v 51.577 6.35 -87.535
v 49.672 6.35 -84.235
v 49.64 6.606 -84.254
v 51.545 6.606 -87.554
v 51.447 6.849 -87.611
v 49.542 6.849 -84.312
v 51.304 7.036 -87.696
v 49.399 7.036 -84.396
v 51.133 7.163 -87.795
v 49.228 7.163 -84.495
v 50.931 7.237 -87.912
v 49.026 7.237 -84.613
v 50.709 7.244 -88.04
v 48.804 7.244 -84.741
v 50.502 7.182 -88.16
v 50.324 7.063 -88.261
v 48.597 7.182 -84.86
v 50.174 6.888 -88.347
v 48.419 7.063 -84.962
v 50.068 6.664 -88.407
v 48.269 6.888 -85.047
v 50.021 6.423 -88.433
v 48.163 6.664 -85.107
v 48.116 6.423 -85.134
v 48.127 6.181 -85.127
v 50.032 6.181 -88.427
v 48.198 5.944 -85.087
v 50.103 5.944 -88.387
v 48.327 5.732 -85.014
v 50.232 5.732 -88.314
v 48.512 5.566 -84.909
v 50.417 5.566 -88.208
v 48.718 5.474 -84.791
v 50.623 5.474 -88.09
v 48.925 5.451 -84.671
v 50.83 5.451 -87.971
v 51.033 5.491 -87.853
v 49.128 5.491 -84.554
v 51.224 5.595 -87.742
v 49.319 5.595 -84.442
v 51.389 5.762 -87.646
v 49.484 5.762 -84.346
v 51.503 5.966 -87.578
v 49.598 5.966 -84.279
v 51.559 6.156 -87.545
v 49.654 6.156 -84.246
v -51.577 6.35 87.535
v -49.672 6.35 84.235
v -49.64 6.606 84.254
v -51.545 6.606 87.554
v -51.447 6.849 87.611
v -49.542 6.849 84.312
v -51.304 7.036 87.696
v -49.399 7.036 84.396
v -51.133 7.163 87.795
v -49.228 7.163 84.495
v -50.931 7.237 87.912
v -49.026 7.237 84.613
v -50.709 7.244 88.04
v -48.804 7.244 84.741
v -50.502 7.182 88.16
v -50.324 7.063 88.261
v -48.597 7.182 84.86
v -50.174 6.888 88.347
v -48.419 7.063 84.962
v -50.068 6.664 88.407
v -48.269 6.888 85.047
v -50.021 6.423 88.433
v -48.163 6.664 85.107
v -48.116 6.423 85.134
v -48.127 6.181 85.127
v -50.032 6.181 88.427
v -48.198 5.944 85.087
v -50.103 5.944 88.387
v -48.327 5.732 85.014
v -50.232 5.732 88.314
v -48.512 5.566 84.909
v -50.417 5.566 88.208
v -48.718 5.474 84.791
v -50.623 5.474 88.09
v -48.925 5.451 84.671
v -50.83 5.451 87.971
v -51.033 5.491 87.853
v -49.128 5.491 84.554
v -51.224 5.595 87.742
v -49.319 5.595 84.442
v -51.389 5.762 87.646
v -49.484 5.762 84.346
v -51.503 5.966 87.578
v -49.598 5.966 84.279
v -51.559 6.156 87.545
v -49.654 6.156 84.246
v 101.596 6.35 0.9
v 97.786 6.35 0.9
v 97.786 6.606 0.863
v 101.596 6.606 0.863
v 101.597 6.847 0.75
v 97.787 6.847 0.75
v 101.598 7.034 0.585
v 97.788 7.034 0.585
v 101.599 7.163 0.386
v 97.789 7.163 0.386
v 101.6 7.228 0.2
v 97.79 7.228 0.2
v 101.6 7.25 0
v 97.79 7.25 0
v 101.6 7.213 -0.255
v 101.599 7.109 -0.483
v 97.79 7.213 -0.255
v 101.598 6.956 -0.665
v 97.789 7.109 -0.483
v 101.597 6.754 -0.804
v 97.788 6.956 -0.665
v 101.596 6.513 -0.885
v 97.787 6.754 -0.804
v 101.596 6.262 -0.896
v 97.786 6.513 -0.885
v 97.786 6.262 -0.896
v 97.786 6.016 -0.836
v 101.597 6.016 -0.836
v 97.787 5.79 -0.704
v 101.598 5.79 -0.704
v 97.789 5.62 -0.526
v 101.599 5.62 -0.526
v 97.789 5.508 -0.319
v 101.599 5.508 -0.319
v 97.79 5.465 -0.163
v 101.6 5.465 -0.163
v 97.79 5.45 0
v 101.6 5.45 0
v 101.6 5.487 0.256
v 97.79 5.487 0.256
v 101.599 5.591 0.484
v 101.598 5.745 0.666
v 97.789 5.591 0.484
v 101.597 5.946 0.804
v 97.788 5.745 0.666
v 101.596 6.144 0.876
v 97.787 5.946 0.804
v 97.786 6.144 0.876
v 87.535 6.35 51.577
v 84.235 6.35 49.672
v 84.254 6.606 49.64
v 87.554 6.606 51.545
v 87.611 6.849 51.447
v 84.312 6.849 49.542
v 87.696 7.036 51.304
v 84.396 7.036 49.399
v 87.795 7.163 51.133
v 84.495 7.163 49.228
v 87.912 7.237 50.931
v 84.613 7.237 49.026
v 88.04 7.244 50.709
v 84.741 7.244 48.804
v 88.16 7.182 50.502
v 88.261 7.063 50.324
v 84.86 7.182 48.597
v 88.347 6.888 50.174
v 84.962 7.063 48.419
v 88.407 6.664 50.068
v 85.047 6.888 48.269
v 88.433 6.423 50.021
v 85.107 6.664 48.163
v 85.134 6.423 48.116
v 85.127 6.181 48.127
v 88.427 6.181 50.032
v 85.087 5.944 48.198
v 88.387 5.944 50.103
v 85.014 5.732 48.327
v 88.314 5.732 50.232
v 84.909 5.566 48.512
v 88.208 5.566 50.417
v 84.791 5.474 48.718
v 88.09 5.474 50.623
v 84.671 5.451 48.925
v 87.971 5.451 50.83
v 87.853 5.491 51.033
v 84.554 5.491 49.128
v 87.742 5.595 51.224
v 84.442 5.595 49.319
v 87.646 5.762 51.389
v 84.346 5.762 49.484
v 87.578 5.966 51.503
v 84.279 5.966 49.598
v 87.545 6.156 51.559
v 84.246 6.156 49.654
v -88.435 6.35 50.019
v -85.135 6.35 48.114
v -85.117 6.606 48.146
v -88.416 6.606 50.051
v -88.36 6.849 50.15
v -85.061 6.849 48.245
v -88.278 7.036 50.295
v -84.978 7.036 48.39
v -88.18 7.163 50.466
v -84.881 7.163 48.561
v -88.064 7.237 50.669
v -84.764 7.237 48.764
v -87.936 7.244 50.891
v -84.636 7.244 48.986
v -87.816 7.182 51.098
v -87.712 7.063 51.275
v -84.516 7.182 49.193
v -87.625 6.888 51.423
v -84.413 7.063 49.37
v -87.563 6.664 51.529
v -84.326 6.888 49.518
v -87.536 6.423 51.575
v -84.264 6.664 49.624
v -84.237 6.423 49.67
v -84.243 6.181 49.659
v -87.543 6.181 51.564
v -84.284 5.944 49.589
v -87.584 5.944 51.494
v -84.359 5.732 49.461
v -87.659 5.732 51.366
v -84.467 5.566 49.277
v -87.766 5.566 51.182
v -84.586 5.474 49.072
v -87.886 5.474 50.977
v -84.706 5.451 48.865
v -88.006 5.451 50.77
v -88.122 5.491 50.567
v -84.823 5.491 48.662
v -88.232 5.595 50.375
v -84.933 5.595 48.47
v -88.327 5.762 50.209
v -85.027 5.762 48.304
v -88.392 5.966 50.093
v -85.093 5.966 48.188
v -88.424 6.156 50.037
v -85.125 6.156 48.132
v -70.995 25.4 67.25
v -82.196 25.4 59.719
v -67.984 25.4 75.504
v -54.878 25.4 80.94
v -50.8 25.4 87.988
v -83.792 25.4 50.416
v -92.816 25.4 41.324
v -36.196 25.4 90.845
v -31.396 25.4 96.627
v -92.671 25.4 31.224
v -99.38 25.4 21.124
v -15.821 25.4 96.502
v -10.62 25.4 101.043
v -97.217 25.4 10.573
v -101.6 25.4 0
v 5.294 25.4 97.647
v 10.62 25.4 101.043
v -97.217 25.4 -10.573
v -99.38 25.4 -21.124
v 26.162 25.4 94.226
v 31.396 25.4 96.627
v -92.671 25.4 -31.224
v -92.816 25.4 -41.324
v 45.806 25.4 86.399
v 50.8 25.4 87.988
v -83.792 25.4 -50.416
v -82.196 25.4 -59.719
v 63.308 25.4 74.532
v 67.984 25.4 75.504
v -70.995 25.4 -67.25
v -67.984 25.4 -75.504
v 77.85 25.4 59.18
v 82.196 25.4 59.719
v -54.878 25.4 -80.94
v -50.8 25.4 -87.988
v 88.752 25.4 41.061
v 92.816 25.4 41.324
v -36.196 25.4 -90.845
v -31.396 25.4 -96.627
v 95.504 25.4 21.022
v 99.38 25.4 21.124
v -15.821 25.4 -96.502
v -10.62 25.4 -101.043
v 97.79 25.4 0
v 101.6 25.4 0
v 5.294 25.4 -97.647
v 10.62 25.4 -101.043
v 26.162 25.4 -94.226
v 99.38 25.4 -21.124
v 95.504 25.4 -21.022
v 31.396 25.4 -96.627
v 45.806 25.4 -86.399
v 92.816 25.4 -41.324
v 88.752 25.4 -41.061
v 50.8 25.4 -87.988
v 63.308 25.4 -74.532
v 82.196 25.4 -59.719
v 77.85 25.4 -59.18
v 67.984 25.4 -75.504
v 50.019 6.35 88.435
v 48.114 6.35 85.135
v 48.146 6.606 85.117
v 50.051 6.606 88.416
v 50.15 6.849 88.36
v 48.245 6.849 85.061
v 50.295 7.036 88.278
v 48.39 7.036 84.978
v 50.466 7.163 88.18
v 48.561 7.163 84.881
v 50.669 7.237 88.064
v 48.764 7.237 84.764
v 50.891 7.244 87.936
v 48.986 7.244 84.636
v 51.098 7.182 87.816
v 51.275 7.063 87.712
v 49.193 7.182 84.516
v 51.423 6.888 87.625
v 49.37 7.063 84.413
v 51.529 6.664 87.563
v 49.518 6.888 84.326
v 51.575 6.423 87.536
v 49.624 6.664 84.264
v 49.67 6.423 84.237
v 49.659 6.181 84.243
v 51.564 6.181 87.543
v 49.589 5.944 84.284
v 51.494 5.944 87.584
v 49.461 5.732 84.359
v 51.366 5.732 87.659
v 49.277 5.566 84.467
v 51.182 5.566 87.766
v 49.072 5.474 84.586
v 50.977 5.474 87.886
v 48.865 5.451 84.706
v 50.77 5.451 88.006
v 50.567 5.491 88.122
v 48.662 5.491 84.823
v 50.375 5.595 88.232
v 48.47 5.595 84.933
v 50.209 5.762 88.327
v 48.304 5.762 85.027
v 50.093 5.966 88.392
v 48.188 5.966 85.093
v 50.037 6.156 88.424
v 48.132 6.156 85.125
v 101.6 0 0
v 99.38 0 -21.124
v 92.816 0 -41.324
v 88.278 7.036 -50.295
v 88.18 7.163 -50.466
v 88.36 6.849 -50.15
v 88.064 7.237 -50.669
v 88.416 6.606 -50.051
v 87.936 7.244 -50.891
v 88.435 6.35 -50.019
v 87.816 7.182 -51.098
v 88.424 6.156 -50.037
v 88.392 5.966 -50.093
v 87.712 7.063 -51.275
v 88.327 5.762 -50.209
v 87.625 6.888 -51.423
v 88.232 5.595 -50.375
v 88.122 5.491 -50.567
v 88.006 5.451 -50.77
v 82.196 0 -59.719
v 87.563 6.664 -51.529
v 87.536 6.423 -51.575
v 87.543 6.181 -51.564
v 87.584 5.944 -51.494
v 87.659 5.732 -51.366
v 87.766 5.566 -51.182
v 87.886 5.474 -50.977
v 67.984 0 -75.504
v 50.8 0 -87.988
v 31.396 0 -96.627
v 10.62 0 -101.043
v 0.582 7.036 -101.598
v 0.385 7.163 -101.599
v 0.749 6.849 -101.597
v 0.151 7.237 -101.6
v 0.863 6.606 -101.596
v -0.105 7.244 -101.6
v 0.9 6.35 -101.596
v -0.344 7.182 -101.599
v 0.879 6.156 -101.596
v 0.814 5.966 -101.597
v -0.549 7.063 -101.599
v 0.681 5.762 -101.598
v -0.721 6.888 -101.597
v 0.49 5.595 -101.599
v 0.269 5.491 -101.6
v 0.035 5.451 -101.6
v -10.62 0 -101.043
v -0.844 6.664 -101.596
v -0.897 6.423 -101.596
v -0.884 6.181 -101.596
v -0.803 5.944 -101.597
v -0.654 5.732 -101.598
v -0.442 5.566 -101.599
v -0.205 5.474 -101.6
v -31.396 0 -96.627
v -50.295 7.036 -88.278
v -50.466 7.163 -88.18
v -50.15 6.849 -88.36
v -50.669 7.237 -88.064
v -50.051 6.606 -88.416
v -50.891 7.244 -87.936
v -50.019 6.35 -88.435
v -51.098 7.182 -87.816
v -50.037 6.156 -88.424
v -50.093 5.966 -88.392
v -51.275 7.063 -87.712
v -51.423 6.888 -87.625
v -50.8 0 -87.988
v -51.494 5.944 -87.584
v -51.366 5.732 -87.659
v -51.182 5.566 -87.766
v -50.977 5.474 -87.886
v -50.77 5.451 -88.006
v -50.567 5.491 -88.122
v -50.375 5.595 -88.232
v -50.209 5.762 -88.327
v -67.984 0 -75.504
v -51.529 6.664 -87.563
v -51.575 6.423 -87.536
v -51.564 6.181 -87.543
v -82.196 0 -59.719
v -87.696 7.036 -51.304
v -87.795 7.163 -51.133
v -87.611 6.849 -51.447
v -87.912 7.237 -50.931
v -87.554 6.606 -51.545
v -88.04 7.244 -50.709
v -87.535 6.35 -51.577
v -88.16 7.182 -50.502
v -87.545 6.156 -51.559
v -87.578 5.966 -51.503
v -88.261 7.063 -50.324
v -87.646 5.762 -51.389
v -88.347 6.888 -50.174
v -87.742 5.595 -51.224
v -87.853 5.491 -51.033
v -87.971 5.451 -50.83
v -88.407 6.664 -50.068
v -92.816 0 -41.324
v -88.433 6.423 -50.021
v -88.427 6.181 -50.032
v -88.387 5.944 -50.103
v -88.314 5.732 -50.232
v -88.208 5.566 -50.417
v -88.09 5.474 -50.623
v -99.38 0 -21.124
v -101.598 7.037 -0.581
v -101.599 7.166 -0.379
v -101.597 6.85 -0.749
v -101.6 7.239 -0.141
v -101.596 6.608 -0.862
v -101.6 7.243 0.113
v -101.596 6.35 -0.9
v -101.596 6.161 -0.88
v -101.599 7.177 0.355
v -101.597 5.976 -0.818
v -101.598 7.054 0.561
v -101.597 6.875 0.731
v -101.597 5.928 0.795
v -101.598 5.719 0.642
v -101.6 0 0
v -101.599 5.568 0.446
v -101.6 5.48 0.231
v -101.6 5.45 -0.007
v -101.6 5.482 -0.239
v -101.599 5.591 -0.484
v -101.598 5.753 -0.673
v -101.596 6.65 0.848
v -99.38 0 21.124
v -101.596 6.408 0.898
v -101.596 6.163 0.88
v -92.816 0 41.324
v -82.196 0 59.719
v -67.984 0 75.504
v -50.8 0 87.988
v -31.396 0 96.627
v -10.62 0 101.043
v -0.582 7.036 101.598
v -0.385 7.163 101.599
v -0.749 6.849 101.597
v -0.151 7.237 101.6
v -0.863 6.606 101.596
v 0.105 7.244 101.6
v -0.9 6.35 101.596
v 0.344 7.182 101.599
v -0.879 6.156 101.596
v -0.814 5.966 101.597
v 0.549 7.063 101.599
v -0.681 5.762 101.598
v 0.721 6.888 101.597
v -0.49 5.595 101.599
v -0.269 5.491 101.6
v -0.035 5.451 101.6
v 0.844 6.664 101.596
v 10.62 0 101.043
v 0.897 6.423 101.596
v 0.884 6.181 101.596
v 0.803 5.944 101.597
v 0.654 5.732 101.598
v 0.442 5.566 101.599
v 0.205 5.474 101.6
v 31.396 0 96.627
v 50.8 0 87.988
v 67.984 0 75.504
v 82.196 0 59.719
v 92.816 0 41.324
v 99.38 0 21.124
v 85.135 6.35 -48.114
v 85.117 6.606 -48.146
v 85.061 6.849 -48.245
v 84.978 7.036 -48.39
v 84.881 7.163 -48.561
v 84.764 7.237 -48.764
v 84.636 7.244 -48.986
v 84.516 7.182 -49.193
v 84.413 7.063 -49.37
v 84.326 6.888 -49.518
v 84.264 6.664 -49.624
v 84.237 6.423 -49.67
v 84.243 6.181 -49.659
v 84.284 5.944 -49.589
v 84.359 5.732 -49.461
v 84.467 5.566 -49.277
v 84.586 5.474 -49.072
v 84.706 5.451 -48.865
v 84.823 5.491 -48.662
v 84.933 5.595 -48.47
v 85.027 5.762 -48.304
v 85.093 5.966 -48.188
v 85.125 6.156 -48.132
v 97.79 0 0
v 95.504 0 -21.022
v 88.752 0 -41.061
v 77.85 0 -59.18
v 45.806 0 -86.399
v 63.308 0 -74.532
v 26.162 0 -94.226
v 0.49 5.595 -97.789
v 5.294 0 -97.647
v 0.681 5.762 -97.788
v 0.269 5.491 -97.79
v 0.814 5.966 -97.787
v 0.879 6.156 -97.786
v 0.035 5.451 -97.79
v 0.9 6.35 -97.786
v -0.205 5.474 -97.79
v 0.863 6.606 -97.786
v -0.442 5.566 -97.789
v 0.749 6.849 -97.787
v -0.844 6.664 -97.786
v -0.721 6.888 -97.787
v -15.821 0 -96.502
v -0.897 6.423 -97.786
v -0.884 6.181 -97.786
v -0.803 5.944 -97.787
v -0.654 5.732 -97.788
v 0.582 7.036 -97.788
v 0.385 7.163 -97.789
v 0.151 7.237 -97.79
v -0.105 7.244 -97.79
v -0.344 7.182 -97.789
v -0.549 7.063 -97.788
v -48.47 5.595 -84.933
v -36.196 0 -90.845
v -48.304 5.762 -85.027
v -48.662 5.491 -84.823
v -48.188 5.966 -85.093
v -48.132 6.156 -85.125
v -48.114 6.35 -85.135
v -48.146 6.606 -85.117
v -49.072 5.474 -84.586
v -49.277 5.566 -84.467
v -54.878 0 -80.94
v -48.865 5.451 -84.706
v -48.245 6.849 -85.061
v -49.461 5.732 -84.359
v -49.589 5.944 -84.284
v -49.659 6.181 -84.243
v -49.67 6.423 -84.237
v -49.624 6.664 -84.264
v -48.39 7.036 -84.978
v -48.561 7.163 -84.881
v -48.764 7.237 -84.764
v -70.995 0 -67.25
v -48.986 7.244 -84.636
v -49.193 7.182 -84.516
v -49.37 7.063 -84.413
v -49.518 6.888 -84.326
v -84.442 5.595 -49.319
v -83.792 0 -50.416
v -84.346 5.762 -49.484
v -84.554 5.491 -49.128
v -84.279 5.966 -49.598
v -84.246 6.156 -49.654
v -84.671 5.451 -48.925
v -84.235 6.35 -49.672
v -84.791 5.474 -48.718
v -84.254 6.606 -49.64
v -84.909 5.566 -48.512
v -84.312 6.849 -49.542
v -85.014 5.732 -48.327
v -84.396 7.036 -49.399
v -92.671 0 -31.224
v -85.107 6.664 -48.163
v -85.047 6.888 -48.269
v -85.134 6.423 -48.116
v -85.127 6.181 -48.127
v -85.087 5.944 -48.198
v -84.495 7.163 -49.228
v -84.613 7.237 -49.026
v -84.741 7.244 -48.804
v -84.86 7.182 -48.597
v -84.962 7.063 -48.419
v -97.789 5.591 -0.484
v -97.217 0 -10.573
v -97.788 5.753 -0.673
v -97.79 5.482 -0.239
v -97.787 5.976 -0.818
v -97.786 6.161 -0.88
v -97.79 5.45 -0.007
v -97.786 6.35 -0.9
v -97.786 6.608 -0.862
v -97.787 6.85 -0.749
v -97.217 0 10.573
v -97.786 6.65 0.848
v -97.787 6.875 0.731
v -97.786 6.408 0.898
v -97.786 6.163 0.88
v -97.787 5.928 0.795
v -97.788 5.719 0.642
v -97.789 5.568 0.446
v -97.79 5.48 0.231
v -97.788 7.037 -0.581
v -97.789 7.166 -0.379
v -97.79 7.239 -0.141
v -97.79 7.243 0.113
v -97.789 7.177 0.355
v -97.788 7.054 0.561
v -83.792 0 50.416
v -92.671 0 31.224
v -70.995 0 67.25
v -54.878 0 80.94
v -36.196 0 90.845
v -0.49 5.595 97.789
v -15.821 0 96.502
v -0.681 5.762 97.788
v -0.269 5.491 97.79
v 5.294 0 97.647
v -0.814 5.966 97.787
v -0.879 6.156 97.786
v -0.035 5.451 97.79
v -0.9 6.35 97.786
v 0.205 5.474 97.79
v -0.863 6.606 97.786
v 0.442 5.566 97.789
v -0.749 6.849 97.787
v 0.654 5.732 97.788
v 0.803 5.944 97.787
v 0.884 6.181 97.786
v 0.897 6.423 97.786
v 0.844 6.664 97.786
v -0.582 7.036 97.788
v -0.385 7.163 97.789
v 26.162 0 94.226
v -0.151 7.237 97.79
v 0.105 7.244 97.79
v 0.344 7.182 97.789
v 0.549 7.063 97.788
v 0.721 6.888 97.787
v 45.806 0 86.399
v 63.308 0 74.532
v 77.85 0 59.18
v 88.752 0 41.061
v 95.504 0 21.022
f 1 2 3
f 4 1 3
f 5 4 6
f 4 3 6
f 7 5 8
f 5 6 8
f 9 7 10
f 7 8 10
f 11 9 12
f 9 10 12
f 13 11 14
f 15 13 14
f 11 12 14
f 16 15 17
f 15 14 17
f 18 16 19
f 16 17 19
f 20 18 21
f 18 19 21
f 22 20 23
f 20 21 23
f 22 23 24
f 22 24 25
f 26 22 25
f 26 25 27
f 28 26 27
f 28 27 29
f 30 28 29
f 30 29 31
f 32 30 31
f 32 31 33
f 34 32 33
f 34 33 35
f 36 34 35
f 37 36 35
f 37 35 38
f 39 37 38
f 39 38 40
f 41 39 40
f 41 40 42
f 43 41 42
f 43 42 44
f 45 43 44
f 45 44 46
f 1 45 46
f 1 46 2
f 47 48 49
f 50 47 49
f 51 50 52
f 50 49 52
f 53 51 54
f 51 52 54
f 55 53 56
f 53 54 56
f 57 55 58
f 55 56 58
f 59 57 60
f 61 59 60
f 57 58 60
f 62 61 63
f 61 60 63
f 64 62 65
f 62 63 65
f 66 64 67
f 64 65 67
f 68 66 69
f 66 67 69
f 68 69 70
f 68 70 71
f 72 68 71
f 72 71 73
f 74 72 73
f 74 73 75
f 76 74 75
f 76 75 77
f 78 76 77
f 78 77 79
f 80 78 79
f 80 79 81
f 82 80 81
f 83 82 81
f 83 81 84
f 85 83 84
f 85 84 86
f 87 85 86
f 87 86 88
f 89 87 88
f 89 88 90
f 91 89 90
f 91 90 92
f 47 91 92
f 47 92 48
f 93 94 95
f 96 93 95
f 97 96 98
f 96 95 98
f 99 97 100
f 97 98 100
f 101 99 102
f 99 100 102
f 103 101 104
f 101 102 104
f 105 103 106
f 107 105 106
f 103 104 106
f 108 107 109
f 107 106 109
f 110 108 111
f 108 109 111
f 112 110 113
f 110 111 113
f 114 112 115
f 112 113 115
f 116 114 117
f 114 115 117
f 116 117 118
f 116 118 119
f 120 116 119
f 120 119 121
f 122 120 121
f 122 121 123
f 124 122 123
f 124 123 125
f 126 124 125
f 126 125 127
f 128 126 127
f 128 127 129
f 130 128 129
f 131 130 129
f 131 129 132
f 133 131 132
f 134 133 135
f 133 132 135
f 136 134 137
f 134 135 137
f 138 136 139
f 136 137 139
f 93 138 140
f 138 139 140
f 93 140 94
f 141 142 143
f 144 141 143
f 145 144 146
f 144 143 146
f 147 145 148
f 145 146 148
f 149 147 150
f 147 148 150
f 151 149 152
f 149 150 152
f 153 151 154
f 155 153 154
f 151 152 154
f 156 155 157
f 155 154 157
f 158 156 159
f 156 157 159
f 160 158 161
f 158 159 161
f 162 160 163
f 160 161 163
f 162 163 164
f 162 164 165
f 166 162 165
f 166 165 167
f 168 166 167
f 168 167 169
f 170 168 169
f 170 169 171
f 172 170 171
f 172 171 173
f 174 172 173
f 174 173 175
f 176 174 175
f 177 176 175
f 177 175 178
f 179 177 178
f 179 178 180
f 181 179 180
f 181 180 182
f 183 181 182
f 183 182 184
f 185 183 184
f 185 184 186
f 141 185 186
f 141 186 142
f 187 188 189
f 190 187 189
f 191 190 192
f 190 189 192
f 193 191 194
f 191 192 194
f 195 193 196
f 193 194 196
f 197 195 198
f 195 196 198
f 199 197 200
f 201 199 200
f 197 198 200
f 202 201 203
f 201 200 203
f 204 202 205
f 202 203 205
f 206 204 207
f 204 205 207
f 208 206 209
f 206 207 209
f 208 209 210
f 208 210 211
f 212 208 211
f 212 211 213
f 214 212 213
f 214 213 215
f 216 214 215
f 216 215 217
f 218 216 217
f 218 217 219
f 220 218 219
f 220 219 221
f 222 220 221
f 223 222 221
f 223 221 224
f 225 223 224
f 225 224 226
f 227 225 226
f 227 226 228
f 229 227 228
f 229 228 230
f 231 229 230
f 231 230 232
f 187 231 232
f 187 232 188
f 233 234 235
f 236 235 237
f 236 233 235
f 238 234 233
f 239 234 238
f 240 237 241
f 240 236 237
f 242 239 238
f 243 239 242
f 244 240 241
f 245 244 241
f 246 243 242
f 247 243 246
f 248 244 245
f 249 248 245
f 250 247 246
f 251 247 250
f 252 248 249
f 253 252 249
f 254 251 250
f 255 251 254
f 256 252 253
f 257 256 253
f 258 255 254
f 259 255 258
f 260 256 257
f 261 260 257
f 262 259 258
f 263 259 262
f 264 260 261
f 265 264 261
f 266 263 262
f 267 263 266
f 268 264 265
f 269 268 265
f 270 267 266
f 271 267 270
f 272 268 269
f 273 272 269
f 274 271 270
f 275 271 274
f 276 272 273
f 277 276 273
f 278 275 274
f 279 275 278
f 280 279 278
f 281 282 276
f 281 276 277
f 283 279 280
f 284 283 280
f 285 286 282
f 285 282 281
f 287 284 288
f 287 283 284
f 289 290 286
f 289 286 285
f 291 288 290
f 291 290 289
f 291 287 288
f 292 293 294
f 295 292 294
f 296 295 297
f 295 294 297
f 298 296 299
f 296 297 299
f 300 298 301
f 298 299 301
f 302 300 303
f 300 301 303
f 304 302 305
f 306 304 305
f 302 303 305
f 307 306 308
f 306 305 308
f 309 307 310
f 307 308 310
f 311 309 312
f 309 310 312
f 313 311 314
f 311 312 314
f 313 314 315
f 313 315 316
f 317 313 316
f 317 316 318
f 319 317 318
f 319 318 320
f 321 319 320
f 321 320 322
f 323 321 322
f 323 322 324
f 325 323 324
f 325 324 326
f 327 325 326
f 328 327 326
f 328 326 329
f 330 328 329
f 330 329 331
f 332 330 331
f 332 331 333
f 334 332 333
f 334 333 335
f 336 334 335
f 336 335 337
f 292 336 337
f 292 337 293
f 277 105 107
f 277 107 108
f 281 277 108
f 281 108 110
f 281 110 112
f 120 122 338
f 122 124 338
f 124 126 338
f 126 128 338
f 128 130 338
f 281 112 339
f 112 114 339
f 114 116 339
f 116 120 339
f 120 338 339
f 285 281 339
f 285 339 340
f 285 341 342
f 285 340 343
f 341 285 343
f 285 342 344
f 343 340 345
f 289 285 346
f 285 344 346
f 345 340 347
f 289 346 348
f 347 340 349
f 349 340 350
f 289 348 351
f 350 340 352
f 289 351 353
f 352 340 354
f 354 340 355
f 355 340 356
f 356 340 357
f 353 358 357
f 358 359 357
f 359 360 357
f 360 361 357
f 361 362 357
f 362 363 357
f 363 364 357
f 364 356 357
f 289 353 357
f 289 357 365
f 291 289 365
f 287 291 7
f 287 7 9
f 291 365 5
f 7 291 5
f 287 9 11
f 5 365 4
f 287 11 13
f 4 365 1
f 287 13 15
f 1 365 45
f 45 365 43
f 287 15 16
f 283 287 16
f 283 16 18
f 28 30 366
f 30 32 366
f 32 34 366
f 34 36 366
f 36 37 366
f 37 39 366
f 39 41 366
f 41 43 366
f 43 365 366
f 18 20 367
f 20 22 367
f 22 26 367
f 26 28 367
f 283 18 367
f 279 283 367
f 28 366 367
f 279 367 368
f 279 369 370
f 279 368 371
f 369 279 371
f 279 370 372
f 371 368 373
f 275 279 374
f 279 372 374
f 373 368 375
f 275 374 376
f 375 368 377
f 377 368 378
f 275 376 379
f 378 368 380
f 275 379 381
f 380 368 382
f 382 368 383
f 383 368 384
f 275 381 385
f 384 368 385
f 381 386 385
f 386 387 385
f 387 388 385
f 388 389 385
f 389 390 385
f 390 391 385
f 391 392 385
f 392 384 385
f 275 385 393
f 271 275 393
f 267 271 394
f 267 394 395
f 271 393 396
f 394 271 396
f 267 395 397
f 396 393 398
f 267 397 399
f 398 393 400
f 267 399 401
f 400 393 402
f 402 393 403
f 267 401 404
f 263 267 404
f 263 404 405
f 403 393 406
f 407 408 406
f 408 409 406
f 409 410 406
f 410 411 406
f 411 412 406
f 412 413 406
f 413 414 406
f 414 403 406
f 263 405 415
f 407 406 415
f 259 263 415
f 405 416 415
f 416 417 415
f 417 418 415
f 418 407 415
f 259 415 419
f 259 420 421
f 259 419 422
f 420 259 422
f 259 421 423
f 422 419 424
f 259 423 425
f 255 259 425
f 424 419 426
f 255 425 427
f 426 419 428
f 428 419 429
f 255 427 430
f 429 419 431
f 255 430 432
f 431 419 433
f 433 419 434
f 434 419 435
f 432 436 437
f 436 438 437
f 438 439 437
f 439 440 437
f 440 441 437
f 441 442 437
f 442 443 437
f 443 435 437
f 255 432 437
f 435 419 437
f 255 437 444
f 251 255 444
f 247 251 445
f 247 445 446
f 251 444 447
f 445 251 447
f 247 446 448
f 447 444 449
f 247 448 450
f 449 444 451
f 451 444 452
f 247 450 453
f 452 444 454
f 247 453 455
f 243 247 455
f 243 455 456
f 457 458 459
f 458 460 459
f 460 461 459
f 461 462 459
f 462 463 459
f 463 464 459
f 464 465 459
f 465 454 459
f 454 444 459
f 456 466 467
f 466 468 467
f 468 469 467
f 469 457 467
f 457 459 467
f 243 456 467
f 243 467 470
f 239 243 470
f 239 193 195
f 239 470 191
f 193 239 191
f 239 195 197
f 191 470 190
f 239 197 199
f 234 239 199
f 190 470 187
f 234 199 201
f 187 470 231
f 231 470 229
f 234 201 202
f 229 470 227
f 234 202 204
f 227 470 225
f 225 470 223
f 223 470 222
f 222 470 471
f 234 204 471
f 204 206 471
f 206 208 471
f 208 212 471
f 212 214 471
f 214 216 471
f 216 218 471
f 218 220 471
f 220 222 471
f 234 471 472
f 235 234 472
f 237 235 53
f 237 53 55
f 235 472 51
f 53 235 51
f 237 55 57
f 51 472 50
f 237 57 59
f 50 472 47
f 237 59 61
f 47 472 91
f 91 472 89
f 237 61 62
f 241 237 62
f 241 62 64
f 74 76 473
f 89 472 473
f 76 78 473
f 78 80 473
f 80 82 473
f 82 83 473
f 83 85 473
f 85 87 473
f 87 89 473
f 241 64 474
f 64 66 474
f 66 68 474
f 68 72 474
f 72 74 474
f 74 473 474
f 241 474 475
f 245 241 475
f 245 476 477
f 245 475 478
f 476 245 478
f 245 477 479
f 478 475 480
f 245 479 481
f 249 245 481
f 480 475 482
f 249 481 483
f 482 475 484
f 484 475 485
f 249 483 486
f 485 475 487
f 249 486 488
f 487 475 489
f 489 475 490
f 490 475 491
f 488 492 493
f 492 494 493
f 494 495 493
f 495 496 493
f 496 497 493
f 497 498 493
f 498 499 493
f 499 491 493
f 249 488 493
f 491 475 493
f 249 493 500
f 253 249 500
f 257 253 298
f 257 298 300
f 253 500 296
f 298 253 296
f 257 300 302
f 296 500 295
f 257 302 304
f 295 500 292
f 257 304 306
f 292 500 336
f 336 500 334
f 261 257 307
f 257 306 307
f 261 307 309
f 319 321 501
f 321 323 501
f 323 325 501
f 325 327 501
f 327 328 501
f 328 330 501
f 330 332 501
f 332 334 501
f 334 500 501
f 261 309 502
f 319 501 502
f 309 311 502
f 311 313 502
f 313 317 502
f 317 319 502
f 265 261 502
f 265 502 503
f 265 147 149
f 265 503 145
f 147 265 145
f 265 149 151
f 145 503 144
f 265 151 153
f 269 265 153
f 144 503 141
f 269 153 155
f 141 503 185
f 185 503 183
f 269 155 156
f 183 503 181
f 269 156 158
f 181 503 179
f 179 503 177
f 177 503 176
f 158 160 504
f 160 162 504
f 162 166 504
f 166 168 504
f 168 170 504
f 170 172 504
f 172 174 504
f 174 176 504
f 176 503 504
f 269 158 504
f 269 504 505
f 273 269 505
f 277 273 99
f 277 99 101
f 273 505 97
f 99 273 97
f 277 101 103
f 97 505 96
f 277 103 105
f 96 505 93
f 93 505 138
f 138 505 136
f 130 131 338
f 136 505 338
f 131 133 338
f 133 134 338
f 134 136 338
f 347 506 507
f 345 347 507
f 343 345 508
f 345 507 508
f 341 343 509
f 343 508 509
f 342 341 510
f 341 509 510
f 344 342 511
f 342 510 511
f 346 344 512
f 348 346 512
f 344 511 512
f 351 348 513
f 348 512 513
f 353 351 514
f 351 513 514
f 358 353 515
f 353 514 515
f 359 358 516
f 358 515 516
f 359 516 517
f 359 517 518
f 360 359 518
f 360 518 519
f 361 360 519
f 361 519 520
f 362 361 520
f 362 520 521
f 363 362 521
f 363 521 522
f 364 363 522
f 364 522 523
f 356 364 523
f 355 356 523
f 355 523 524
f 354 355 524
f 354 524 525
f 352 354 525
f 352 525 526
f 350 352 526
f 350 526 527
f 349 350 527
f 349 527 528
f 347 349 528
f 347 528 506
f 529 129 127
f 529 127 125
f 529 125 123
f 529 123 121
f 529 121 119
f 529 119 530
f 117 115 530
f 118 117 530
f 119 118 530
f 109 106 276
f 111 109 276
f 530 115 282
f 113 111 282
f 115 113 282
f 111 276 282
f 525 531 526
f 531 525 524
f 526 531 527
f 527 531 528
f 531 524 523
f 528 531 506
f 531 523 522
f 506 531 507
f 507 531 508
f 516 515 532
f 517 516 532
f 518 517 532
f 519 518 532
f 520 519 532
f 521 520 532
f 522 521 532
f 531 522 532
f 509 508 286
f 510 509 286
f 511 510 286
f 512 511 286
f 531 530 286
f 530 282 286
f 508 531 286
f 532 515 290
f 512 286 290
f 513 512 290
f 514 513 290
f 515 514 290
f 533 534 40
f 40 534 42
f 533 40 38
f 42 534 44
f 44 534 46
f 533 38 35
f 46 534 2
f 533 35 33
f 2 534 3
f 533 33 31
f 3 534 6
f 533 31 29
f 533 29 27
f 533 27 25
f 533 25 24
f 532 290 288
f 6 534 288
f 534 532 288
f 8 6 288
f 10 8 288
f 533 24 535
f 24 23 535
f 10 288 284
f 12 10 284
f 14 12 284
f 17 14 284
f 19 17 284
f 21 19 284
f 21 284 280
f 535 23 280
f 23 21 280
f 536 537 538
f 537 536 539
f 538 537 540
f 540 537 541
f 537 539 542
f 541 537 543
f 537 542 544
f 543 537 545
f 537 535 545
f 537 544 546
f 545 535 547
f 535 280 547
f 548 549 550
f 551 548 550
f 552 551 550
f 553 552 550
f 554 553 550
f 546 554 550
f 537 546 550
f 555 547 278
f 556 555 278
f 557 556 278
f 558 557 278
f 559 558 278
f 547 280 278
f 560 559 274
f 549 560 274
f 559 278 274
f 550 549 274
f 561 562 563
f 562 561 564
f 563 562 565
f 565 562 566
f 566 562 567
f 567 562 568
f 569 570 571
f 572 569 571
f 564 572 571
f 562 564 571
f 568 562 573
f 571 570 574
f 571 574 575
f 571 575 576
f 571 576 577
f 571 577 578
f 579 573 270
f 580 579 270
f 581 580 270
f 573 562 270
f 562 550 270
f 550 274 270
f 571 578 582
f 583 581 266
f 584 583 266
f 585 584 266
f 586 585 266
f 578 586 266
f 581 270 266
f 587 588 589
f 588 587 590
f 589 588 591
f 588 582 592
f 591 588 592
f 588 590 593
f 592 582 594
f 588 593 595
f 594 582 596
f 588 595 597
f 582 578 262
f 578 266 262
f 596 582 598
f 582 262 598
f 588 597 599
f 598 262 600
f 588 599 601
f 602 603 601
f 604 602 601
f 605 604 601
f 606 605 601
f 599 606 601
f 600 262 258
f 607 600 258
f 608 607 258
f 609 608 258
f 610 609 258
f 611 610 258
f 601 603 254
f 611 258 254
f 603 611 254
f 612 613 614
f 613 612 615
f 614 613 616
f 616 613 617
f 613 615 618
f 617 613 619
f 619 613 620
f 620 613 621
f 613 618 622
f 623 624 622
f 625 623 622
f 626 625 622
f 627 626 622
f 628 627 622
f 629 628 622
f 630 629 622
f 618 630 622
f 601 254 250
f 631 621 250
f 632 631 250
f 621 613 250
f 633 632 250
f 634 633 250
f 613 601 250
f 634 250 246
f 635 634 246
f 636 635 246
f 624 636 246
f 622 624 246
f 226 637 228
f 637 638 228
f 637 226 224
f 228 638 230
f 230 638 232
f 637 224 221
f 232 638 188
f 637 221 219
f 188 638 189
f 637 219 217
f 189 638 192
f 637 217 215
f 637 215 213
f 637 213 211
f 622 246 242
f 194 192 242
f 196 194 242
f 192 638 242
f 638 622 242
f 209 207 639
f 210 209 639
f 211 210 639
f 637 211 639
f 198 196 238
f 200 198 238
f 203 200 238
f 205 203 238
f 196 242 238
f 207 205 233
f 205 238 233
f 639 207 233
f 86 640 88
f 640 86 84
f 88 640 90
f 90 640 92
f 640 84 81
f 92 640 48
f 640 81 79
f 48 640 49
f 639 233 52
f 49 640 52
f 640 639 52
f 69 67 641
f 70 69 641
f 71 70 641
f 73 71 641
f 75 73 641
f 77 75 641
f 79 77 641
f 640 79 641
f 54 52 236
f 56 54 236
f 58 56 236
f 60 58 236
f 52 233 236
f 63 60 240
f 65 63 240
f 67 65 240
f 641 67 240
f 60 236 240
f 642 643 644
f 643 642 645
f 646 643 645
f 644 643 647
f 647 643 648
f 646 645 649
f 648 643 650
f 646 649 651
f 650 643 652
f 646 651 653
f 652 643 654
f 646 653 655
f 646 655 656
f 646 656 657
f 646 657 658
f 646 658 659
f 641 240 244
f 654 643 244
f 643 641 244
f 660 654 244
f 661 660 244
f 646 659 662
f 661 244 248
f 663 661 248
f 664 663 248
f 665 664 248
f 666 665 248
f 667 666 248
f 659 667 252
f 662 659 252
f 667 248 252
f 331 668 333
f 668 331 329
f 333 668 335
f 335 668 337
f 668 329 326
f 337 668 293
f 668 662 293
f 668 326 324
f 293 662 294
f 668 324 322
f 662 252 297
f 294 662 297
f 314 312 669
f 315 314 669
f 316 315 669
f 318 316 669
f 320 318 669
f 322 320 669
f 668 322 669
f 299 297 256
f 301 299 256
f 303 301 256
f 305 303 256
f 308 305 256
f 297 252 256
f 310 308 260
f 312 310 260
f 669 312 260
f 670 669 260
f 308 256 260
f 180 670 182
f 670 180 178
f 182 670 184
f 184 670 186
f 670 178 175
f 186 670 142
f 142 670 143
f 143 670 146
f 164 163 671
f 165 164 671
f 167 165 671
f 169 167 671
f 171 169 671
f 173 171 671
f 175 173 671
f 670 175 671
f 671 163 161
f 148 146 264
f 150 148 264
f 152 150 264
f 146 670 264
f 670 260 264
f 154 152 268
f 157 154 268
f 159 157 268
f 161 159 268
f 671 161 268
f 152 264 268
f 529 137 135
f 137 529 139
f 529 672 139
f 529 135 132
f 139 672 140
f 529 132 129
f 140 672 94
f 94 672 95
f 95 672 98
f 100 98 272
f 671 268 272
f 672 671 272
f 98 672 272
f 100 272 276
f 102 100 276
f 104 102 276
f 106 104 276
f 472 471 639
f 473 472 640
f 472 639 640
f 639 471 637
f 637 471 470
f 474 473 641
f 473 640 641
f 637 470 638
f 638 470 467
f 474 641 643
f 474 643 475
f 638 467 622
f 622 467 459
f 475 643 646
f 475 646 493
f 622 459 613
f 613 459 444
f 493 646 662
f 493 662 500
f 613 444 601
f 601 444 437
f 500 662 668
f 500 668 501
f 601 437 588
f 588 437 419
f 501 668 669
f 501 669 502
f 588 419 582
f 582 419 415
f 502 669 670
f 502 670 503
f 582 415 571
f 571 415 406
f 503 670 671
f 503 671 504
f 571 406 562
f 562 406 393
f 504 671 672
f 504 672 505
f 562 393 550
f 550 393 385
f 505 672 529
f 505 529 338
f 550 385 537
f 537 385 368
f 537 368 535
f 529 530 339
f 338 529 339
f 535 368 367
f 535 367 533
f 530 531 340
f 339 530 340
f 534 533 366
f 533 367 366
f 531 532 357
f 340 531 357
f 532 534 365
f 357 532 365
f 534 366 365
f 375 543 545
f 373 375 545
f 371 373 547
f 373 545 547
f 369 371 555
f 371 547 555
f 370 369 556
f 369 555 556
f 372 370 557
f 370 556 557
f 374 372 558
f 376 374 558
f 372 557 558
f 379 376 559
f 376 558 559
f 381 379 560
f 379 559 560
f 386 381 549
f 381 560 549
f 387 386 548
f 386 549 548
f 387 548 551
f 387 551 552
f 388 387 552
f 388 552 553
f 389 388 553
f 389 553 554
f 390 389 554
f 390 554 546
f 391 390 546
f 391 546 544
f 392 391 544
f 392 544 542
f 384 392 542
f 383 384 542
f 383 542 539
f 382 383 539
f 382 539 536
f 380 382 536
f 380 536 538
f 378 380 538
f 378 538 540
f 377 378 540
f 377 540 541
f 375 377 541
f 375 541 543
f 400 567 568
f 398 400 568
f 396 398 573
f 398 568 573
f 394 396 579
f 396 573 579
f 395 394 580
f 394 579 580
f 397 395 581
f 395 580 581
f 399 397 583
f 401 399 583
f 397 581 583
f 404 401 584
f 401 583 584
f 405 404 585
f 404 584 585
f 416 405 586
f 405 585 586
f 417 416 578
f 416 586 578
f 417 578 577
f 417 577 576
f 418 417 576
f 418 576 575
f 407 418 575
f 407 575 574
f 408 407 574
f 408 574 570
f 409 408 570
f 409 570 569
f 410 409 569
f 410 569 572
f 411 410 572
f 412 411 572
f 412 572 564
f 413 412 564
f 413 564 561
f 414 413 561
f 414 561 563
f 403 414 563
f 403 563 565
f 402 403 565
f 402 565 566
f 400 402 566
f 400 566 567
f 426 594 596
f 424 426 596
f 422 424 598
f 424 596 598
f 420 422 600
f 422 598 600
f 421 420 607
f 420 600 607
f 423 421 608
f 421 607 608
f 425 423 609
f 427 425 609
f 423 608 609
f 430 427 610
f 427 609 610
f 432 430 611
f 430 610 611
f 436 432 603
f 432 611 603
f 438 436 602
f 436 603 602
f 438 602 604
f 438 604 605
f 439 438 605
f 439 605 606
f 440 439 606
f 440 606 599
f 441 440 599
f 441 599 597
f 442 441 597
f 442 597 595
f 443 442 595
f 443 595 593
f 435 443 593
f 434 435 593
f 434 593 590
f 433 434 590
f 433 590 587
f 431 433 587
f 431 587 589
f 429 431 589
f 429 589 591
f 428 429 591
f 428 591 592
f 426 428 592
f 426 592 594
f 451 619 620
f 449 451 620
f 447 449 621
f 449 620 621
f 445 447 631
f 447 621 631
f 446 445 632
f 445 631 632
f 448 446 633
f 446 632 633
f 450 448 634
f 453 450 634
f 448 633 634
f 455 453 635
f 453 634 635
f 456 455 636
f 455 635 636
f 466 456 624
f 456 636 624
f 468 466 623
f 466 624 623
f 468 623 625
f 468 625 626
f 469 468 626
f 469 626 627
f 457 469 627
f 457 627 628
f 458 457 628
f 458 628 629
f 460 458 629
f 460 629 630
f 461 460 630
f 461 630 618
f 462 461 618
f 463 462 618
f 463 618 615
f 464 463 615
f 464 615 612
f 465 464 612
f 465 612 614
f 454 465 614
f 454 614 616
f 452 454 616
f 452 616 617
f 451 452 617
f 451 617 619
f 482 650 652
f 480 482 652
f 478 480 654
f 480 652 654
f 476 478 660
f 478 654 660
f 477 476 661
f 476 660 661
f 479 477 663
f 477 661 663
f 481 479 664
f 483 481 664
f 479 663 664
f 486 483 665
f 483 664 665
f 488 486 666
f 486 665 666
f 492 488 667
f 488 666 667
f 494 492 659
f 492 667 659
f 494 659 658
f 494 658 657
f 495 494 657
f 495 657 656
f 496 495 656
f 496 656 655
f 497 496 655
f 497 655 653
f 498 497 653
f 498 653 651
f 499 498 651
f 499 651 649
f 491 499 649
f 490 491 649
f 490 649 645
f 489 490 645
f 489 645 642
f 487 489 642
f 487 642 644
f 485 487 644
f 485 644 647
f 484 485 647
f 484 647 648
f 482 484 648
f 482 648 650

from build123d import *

# Parameters (mm, degrees)
SKETCH1_R           = 101.6
SKETCH1_R_2         = 82.55
BOSS_EXTRUDE1_DEPTH = 25.4
SKETCH2_R           = 97.79
SKETCH2_R_2         = 63.5
CUT_EXTRUDE1_DEPTH  = 50.8
SKETCH3_R           = 0.9
CUT_EXTRUDE2_DEPTH  = 254
CIRPATTERN1_COUNT   = 12


with BuildPart() as part:
    # Sketch1 → Boss-Extrude1 (new body)
    with BuildSketch(Plane(origin=(0, 0, 0), x_dir=(1, 0, 0), z_dir=(0, 1, 0))):
        Circle(SKETCH1_R)
        Circle(SKETCH1_R_2, mode=Mode.SUBTRACT)
    extrude(amount=BOSS_EXTRUDE1_DEPTH)

    # Sketch2 → Cut-Extrude1 (cut)
    with BuildSketch(Plane(origin=(0, 25.4, 0), x_dir=(1, 0, 0), z_dir=(0, 1, 0))):
        Circle(SKETCH2_R)
        Circle(SKETCH2_R_2, mode=Mode.SUBTRACT)
    extrude(amount=-CUT_EXTRUDE1_DEPTH, mode=Mode.SUBTRACT)

    # Sketch3 → Cut-Extrude2 (cut)
    with BuildSketch(Plane.XY):
        with Locations((0, 6.35)):
            Circle(SKETCH3_R)
    cut_extrude2 = extrude(amount=-CUT_EXTRUDE2_DEPTH, mode=Mode.SUBTRACT)

    # CirPattern1: Cut-Extrude2 ×12 about axis
    cirpattern1_axis = Axis((0, 25.4, 0), (0, 1, 0))
    for i in range(1, CIRPATTERN1_COUNT):
        add(cut_extrude2.rotate(cirpattern1_axis, i * 360 / CIRPATTERN1_COUNT), mode=Mode.SUBTRACT)


solid = part.part
